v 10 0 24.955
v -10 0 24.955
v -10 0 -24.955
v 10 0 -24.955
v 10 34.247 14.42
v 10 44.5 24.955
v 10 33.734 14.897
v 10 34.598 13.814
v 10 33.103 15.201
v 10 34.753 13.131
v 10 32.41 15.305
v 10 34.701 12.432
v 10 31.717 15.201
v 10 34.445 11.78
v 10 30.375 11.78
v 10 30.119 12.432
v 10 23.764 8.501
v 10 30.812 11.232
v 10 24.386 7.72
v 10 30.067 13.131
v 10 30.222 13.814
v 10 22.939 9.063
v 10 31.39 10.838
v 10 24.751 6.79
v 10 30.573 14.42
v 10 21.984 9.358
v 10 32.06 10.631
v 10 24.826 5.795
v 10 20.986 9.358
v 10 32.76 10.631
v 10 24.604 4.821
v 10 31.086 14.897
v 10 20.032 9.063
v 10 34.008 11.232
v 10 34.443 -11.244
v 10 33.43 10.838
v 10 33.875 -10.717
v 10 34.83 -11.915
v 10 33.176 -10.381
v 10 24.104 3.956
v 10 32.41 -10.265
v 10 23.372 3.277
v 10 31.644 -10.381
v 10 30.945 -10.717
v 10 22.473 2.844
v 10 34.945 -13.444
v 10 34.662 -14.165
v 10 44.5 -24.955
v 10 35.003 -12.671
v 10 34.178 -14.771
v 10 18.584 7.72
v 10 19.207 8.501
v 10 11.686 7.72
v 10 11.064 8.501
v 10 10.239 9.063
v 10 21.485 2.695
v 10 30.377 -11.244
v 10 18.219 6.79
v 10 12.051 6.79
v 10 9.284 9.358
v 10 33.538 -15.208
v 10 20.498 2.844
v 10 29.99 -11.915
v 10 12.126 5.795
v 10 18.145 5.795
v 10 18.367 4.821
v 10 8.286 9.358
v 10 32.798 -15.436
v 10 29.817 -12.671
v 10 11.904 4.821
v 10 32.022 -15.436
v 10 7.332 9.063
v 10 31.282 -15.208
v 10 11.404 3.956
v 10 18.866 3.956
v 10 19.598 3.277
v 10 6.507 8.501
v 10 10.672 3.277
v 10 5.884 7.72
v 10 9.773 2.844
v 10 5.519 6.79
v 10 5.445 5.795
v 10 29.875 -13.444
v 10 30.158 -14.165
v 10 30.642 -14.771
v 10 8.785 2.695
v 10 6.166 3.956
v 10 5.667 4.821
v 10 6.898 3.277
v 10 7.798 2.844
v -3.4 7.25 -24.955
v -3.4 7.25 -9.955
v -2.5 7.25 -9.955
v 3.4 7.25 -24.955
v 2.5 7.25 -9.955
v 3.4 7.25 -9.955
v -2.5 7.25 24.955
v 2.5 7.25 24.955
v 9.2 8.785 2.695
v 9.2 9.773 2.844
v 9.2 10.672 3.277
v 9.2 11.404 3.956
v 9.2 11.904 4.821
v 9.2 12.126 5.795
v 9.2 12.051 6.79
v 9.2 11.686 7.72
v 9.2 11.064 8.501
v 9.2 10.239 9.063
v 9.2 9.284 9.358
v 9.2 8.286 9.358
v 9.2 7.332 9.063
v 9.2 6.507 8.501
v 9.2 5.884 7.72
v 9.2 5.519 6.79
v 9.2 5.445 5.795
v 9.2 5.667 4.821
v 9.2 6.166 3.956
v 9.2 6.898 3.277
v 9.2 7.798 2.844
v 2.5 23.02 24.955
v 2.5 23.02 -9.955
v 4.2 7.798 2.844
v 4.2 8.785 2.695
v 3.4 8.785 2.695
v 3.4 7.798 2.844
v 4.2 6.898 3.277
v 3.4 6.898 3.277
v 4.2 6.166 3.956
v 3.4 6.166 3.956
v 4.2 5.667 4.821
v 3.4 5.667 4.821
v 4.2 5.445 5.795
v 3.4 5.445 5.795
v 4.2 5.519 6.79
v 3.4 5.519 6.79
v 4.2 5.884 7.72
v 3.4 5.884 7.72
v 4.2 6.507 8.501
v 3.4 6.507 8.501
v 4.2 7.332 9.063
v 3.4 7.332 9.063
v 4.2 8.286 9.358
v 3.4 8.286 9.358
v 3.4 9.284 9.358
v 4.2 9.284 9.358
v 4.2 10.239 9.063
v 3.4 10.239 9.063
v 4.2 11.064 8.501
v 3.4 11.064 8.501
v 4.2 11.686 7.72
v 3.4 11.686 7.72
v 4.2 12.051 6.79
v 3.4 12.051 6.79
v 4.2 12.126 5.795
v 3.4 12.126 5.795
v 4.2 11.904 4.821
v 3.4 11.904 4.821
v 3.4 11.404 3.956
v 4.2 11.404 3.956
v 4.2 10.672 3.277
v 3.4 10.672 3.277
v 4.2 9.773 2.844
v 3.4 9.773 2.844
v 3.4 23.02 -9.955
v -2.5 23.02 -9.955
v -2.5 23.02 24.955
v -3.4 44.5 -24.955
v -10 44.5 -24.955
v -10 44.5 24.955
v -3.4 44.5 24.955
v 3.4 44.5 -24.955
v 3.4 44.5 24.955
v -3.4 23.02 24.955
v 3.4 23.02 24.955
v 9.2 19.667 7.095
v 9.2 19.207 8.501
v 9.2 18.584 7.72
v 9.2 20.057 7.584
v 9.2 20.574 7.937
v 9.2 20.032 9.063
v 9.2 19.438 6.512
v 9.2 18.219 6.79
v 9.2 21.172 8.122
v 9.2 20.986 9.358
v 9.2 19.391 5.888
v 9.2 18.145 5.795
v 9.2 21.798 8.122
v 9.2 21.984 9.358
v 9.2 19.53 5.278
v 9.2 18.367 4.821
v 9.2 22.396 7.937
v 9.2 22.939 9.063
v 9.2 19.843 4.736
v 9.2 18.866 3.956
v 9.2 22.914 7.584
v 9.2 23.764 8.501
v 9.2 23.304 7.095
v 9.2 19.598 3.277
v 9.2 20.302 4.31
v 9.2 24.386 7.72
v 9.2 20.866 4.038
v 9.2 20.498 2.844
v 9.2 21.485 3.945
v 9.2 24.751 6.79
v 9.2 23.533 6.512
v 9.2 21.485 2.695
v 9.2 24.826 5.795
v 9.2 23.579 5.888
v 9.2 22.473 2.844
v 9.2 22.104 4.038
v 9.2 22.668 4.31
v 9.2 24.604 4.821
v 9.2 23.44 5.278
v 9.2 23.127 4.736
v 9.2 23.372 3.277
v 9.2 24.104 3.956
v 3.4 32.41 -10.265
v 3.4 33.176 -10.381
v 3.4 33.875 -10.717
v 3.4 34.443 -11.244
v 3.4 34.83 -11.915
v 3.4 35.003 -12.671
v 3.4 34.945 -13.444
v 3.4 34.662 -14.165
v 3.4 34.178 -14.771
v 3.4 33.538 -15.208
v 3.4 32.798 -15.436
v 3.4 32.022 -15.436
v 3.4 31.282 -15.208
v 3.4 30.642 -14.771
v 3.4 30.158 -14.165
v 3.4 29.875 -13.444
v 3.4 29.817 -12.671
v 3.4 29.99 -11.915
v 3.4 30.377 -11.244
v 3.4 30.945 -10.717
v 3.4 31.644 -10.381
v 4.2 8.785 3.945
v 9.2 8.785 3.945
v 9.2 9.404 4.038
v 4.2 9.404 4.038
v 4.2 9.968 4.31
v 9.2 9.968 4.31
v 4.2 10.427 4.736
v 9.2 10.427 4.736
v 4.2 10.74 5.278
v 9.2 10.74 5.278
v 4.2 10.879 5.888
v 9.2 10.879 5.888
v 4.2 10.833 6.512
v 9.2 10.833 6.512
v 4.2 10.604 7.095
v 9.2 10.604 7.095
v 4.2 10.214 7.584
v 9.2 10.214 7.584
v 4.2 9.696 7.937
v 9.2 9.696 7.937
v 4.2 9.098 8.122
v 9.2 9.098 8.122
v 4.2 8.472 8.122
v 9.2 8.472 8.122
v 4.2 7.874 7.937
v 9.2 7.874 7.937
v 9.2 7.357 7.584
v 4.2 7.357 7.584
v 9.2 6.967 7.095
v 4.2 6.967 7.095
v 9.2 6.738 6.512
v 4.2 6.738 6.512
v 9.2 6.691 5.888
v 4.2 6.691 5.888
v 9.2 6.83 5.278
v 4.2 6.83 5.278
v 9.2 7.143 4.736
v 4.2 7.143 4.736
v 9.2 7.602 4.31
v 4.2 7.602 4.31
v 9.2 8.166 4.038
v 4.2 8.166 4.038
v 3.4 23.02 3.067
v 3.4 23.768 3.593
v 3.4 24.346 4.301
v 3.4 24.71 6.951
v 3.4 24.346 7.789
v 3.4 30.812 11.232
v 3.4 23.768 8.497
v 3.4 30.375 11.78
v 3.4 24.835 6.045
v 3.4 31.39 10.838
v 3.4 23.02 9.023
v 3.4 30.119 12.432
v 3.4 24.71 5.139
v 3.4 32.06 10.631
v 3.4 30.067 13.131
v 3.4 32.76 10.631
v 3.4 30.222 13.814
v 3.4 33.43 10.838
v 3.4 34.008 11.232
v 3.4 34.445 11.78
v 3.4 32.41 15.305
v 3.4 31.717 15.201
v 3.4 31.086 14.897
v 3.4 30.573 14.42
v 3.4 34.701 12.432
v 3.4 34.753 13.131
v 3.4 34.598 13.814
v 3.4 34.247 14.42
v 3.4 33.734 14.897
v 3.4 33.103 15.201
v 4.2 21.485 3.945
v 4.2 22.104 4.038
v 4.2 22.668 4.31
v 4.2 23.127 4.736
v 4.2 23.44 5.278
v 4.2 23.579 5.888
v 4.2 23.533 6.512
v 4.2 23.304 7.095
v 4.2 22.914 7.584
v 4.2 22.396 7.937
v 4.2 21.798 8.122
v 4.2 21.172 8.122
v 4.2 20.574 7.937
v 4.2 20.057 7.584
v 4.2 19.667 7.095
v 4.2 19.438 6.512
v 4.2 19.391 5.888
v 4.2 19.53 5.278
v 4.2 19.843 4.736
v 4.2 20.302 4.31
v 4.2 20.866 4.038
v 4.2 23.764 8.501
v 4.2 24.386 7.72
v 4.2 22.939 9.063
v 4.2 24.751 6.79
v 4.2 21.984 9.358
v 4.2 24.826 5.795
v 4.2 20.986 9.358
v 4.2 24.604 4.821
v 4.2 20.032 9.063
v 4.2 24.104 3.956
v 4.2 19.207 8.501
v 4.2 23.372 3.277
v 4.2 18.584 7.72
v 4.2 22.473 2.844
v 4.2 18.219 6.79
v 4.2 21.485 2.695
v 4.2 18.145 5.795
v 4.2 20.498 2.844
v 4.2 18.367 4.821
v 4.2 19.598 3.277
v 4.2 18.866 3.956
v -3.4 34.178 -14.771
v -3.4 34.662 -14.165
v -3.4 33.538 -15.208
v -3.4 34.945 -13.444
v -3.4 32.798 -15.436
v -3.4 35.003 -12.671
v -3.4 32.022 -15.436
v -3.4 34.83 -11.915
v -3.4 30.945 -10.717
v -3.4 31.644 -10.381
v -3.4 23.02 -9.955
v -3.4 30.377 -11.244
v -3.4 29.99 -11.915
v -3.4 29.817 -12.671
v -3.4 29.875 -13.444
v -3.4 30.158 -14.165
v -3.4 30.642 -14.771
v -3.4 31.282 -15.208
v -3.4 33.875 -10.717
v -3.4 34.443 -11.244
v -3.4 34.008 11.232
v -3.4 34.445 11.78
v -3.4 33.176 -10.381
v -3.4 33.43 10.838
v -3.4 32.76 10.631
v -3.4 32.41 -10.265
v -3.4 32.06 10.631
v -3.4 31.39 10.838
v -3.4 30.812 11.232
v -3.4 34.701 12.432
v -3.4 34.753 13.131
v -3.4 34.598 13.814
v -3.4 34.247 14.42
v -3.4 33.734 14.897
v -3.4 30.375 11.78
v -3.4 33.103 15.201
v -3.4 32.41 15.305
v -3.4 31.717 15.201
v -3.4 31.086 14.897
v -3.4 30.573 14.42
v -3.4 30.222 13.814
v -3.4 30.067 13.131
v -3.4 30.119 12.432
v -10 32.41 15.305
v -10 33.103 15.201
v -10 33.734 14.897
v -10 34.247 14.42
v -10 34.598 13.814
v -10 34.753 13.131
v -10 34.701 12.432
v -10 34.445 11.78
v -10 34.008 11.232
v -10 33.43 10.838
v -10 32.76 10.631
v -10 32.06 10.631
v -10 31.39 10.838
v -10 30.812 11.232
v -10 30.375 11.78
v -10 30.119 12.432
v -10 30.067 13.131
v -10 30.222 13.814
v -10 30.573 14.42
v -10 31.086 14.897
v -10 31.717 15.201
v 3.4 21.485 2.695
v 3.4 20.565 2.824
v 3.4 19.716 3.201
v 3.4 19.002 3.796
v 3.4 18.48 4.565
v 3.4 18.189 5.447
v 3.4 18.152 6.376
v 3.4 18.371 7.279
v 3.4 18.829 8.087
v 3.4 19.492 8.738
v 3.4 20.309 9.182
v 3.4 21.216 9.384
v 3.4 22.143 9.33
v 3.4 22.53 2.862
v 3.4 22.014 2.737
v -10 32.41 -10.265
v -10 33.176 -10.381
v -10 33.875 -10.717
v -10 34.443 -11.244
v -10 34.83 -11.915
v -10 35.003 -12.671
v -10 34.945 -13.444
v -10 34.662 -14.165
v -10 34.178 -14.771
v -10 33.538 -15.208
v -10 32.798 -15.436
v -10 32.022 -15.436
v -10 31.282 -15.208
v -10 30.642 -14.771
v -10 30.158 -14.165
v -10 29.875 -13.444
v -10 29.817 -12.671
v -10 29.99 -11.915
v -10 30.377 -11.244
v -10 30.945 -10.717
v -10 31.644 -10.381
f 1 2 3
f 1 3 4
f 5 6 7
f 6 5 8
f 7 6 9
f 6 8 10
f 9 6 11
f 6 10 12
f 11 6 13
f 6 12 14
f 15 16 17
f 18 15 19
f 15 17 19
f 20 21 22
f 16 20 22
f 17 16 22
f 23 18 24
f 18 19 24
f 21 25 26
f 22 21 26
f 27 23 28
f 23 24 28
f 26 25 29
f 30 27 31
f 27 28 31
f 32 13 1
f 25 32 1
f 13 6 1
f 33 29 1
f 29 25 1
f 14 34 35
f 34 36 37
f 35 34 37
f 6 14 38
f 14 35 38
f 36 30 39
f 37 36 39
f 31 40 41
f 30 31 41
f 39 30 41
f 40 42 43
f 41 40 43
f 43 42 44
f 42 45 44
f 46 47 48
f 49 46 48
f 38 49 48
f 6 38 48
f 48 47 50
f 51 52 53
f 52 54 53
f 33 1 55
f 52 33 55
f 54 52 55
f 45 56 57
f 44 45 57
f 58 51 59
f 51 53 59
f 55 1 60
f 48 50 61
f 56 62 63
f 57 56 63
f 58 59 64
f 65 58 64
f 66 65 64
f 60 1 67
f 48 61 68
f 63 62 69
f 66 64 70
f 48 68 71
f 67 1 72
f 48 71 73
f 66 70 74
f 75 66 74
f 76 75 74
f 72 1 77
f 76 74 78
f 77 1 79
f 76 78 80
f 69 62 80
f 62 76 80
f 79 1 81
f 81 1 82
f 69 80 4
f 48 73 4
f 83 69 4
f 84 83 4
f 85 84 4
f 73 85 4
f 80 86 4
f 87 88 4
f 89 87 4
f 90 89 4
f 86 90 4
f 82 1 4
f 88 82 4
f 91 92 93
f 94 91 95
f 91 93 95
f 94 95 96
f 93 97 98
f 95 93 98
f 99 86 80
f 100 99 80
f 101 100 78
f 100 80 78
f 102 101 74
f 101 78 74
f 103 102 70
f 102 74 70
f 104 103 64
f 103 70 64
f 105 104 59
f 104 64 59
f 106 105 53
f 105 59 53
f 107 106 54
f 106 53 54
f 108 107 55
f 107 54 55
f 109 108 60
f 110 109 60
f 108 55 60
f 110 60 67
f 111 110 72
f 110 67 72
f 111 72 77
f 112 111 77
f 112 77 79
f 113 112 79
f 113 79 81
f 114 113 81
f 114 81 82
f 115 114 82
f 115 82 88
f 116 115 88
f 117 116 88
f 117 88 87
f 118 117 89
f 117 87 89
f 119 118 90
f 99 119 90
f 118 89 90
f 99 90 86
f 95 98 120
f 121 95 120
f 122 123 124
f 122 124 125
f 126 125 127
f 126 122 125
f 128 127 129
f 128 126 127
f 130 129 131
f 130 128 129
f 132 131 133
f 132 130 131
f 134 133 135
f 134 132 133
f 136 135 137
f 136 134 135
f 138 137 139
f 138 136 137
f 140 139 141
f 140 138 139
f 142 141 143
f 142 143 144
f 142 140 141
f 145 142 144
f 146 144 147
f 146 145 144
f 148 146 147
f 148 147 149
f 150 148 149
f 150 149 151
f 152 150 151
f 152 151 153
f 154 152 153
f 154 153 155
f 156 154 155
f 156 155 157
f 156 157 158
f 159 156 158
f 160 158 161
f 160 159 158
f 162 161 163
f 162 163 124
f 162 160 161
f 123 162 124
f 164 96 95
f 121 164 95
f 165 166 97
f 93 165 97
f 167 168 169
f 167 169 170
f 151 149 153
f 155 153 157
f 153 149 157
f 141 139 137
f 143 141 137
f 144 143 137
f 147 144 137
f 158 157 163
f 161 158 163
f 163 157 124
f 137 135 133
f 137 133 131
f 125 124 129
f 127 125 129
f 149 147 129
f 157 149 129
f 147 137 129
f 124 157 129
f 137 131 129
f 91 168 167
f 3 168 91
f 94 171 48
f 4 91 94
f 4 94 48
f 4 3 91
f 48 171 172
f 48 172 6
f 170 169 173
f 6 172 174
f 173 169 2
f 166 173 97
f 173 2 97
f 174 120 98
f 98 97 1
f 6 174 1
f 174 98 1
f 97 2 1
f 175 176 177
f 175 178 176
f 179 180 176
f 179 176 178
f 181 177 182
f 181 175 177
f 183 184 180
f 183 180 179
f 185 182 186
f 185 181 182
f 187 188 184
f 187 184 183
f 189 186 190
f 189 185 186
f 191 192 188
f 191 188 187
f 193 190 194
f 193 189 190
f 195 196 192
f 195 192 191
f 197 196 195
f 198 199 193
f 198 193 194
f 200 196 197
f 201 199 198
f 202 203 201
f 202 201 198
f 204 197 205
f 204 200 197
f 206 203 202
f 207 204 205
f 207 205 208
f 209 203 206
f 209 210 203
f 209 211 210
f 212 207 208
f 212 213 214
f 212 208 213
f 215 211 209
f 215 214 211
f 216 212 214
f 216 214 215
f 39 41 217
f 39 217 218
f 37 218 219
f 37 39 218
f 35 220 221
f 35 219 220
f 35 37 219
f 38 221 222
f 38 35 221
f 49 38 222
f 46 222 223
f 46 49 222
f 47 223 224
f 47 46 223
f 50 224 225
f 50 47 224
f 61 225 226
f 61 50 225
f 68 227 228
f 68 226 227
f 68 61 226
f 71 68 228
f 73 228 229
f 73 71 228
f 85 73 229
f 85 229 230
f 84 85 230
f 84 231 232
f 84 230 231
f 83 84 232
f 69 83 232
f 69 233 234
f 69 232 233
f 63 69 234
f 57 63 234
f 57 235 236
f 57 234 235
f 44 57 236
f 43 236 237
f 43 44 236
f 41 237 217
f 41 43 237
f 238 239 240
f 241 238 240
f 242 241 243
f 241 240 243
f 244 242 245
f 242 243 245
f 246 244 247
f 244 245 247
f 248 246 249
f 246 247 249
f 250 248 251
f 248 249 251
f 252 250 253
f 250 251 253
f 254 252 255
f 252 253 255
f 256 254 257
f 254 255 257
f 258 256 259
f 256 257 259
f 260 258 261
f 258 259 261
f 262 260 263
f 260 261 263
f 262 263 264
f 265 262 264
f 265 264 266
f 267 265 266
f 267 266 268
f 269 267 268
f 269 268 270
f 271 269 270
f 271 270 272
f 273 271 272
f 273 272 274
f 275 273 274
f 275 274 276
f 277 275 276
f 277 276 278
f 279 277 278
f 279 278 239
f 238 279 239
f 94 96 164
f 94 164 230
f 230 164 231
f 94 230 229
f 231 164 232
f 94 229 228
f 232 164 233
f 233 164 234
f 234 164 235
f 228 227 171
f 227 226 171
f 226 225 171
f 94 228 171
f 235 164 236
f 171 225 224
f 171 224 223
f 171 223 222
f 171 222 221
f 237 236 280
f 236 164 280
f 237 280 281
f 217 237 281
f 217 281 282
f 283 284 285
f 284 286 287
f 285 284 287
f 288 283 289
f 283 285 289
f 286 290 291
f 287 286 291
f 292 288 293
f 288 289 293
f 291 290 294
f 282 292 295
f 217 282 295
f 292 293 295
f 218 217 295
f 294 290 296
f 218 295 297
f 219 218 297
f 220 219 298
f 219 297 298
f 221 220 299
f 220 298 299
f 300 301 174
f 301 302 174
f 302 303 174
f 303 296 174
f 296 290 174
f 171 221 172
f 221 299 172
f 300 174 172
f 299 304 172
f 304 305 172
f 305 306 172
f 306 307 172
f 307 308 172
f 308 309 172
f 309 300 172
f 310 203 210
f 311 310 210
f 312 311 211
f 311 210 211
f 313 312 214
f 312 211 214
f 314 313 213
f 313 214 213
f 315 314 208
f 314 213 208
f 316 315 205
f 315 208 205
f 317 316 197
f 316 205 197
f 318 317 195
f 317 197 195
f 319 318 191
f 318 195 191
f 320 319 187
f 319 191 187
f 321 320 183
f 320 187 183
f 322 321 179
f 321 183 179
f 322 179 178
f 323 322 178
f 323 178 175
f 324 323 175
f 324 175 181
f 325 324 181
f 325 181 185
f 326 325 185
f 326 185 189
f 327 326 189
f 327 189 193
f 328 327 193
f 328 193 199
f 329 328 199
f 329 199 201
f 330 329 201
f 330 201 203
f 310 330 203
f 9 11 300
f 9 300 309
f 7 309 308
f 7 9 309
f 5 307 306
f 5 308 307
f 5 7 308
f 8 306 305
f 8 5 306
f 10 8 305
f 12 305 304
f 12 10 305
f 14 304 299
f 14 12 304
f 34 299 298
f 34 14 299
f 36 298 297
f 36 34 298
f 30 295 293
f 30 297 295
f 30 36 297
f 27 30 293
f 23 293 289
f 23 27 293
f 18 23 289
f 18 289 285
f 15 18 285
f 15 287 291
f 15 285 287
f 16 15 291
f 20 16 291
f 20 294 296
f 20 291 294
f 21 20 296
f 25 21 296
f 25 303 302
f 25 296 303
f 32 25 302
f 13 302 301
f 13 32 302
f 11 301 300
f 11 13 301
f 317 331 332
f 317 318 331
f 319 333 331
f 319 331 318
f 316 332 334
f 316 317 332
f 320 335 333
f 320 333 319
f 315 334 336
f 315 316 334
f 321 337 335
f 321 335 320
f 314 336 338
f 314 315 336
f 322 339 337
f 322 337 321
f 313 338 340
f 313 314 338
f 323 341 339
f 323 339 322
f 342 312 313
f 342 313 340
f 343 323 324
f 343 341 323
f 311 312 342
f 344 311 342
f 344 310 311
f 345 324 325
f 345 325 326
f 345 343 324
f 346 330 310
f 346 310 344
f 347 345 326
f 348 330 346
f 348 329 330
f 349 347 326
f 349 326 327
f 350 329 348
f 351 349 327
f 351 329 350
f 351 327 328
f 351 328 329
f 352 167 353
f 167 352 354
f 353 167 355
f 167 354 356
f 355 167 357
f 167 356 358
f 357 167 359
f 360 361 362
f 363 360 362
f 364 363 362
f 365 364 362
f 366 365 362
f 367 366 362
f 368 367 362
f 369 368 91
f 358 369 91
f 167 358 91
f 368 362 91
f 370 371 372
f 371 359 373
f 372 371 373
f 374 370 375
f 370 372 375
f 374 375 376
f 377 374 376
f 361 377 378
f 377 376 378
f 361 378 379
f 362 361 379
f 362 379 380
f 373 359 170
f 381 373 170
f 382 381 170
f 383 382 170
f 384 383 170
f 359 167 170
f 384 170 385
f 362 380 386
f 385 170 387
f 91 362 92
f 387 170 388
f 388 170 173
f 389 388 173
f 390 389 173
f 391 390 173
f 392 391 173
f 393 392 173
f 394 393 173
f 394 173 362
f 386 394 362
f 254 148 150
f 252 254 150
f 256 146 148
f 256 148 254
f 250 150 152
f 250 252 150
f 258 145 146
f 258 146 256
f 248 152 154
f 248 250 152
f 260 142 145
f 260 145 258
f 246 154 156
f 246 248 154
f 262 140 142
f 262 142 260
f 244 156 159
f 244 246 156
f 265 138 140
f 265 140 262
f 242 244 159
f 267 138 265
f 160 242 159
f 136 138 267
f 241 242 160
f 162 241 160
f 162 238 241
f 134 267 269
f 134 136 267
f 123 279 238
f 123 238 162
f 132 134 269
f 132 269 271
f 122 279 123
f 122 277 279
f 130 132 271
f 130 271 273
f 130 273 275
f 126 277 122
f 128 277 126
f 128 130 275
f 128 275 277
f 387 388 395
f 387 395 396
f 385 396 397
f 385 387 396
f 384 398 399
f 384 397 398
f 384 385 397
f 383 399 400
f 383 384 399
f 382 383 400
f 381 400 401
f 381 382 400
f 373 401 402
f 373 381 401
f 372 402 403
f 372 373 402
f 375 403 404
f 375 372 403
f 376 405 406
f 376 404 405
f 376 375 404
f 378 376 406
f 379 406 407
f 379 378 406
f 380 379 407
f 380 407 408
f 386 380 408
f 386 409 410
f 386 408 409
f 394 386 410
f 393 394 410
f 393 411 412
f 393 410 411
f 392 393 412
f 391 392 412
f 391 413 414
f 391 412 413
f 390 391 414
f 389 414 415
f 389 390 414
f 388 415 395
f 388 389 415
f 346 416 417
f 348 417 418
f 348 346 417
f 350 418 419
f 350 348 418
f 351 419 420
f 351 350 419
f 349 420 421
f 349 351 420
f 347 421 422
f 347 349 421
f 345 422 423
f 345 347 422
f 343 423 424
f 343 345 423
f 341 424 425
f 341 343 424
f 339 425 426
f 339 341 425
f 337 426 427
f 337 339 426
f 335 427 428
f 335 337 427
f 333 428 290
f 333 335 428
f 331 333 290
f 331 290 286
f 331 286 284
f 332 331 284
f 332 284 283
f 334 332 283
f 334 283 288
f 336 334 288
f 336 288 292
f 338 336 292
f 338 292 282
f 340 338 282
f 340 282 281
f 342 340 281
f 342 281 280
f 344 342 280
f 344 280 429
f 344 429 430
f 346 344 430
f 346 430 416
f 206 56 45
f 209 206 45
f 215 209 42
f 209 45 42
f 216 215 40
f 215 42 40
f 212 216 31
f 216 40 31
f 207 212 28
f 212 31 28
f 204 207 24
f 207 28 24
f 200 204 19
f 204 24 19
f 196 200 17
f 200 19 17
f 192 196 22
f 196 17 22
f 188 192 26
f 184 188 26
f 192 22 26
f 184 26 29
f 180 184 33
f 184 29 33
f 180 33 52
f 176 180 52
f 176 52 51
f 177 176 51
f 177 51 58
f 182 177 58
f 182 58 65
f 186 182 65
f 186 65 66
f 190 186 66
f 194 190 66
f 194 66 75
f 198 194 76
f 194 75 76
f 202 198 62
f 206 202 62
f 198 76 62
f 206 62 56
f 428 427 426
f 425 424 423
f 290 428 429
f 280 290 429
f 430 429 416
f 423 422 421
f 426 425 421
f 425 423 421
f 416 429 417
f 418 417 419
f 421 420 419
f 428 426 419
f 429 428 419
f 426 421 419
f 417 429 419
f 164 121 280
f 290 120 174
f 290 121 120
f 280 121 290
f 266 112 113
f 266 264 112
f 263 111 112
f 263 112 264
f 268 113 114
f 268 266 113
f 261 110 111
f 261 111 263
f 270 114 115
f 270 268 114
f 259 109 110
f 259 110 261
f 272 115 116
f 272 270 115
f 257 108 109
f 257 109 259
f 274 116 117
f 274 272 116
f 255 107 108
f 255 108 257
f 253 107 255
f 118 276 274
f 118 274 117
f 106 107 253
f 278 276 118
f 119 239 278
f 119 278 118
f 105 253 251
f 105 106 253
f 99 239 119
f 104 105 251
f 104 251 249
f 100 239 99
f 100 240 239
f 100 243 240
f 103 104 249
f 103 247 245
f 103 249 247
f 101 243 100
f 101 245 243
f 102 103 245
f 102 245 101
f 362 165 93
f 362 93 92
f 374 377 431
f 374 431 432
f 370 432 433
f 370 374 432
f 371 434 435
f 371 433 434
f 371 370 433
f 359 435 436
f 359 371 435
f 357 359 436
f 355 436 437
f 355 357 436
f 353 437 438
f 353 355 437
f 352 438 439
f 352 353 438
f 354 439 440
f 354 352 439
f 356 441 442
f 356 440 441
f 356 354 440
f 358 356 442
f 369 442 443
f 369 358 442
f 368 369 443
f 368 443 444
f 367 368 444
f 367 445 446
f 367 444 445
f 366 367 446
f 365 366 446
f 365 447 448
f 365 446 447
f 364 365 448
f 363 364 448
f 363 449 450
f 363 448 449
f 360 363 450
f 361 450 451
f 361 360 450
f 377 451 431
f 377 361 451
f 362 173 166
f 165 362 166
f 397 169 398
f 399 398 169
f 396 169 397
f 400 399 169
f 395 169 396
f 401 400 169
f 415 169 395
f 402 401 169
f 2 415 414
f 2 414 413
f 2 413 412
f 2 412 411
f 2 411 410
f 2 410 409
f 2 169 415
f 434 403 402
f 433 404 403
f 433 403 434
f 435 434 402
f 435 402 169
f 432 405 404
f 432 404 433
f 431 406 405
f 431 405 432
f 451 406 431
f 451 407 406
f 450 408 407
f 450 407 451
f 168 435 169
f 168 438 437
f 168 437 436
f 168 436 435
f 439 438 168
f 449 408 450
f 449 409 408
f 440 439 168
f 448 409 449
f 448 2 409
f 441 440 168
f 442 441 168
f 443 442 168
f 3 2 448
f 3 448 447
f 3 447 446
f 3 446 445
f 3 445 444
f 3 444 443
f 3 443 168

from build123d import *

# Parameters (mm, degrees)
SKETCH2_W               = 20
SKETCH2_H               = 49.91
BOSS_EXTRUDE1_DEPTH     = 44.5
CUT_EXTRUDE3_DEPTH      = 68.611079713
CUT_EXTRUDE5_DEPTH      = 55.799653512
CUT_EXTRUDE5_DEPTH_BACK = 55.799653512
SKETCH8_R               = 2.6
SKETCH8_R_2             = 2.35
SKETCH9_R               = 2.1
CUT_EXTRUDE6_DEPTH      = 6.6
SKETCH9_3_R             = 3.35
SKETCH9_3_R_2           = 2.1
CUT_EXTRUDE7_DEPTH      = 0.8
CUT_EXTRUDE8_START      = -0.8
SKETCH11_R              = 3.35
SKETCH11_R_2            = 2.1
CUT_EXTRUDE8_DEPTH      = 0.8
SKETCH12_W              = 6.8
SKETCH12_H              = 15.77
CUT_EXTRUDE9_DEPTH      = 15


with BuildPart() as part:
    # Sketch2 → Boss-Extrude1 (new body)
    with BuildSketch(Plane(origin=(0, 0, 0), x_dir=(1, 0, 0), z_dir=(0, 1, 0))):
        Rectangle(SKETCH2_W, SKETCH2_H)
    extrude(amount=BOSS_EXTRUDE1_DEPTH)

    # Sketch3 → Cut-Extrude3 (cut, through all)
    with BuildSketch(Plane.XY.offset(24.955)):
        Polygon((3.4, 23.020172412), (3.4, 44.5), (-3.4, 44.5), (-3.4, 23.020172412), (-2.5, 23.020172412), (-2.5, 7.250172412), (2.5, 7.250172412), (2.5, 23.020172412), align=None)
    extrude(amount=-CUT_EXTRUDE3_DEPTH, mode=Mode.SUBTRACT)

    # Sketch8 → Cut-Extrude5 (cut, two sides: drawn at the far end of the back side and taken through both)
    with BuildSketch(Plane.ZY.offset(10).offset(-CUT_EXTRUDE5_DEPTH_BACK)):
        with Locations((-12.865, 32.41)):
            Circle(SKETCH8_R)
        with Locations((12.955, 32.41)):
            Circle(SKETCH8_R_2)
    extrude(amount=CUT_EXTRUDE5_DEPTH + CUT_EXTRUDE5_DEPTH_BACK, mode=Mode.SUBTRACT)

    # Sketch9 → Cut-Extrude6 (cut)
    with BuildSketch(Plane(origin=(10, 0, 0), x_dir=(0, 0, -1), z_dir=(1, 0, 0))):
        with Locations((-6.045, 21.485172412)):
            Circle(SKETCH9_R)
        with Locations((-6.045, 8.785172412)):
            Circle(SKETCH9_R)
    extrude(amount=-CUT_EXTRUDE6_DEPTH, mode=Mode.SUBTRACT)

    # Sketch9<3> → Cut-Extrude7 (cut)
    # profile 1 of 2: a face of its own
    with BuildSketch(Plane(origin=(10, 0, 0), x_dir=(0, 0, -1), z_dir=(1, 0, 0))):
        with Locations((-6.045, 21.485172412)):
            Circle(SKETCH9_3_R)
        with Locations((-6.045, 21.485172412)):
            Circle(SKETCH9_3_R_2, mode=Mode.SUBTRACT)
    # profile 2 of 2: a face of its own
    with BuildSketch(Plane(origin=(10, 0, 0), x_dir=(0, 0, -1), z_dir=(1, 0, 0))):
        with Locations((-6.045, 8.785172412)):
            Circle(SKETCH9_3_R)
        with Locations((-6.045, 8.785172412)):
            Circle(SKETCH9_3_R_2, mode=Mode.SUBTRACT)
    extrude(amount=-CUT_EXTRUDE7_DEPTH, mode=Mode.SUBTRACT)

    # Sketch11 → Cut-Extrude8 (cut)
    # profile 1 of 2: a face of its own
    with BuildSketch(Plane.ZY.offset(-3.4).offset(CUT_EXTRUDE8_START)):
        with Locations((6.045, 21.485172412)):
            Circle(SKETCH11_R)
    # profile 2 of 2: a face of its own
    with BuildSketch(Plane.ZY.offset(-3.4).offset(CUT_EXTRUDE8_START)):
        with Locations((6.045, 8.785172412)):
            Circle(SKETCH11_R)
        with Locations((6.045, 8.785172412)):
            Circle(SKETCH11_R_2, mode=Mode.SUBTRACT)
    extrude(amount=CUT_EXTRUDE8_DEPTH, mode=Mode.SUBTRACT)

    # Sketch12 → Cut-Extrude9 (cut)
    with BuildSketch(Plane(origin=(0, 0, -24.955), x_dir=(-1, 0, 0), z_dir=(0, 0, -1))):
        with Locations((0, 15.135172412)):
            Rectangle(SKETCH12_W, SKETCH12_H)
    extrude(amount=-CUT_EXTRUDE9_DEPTH, mode=Mode.SUBTRACT)


solid = part.part
